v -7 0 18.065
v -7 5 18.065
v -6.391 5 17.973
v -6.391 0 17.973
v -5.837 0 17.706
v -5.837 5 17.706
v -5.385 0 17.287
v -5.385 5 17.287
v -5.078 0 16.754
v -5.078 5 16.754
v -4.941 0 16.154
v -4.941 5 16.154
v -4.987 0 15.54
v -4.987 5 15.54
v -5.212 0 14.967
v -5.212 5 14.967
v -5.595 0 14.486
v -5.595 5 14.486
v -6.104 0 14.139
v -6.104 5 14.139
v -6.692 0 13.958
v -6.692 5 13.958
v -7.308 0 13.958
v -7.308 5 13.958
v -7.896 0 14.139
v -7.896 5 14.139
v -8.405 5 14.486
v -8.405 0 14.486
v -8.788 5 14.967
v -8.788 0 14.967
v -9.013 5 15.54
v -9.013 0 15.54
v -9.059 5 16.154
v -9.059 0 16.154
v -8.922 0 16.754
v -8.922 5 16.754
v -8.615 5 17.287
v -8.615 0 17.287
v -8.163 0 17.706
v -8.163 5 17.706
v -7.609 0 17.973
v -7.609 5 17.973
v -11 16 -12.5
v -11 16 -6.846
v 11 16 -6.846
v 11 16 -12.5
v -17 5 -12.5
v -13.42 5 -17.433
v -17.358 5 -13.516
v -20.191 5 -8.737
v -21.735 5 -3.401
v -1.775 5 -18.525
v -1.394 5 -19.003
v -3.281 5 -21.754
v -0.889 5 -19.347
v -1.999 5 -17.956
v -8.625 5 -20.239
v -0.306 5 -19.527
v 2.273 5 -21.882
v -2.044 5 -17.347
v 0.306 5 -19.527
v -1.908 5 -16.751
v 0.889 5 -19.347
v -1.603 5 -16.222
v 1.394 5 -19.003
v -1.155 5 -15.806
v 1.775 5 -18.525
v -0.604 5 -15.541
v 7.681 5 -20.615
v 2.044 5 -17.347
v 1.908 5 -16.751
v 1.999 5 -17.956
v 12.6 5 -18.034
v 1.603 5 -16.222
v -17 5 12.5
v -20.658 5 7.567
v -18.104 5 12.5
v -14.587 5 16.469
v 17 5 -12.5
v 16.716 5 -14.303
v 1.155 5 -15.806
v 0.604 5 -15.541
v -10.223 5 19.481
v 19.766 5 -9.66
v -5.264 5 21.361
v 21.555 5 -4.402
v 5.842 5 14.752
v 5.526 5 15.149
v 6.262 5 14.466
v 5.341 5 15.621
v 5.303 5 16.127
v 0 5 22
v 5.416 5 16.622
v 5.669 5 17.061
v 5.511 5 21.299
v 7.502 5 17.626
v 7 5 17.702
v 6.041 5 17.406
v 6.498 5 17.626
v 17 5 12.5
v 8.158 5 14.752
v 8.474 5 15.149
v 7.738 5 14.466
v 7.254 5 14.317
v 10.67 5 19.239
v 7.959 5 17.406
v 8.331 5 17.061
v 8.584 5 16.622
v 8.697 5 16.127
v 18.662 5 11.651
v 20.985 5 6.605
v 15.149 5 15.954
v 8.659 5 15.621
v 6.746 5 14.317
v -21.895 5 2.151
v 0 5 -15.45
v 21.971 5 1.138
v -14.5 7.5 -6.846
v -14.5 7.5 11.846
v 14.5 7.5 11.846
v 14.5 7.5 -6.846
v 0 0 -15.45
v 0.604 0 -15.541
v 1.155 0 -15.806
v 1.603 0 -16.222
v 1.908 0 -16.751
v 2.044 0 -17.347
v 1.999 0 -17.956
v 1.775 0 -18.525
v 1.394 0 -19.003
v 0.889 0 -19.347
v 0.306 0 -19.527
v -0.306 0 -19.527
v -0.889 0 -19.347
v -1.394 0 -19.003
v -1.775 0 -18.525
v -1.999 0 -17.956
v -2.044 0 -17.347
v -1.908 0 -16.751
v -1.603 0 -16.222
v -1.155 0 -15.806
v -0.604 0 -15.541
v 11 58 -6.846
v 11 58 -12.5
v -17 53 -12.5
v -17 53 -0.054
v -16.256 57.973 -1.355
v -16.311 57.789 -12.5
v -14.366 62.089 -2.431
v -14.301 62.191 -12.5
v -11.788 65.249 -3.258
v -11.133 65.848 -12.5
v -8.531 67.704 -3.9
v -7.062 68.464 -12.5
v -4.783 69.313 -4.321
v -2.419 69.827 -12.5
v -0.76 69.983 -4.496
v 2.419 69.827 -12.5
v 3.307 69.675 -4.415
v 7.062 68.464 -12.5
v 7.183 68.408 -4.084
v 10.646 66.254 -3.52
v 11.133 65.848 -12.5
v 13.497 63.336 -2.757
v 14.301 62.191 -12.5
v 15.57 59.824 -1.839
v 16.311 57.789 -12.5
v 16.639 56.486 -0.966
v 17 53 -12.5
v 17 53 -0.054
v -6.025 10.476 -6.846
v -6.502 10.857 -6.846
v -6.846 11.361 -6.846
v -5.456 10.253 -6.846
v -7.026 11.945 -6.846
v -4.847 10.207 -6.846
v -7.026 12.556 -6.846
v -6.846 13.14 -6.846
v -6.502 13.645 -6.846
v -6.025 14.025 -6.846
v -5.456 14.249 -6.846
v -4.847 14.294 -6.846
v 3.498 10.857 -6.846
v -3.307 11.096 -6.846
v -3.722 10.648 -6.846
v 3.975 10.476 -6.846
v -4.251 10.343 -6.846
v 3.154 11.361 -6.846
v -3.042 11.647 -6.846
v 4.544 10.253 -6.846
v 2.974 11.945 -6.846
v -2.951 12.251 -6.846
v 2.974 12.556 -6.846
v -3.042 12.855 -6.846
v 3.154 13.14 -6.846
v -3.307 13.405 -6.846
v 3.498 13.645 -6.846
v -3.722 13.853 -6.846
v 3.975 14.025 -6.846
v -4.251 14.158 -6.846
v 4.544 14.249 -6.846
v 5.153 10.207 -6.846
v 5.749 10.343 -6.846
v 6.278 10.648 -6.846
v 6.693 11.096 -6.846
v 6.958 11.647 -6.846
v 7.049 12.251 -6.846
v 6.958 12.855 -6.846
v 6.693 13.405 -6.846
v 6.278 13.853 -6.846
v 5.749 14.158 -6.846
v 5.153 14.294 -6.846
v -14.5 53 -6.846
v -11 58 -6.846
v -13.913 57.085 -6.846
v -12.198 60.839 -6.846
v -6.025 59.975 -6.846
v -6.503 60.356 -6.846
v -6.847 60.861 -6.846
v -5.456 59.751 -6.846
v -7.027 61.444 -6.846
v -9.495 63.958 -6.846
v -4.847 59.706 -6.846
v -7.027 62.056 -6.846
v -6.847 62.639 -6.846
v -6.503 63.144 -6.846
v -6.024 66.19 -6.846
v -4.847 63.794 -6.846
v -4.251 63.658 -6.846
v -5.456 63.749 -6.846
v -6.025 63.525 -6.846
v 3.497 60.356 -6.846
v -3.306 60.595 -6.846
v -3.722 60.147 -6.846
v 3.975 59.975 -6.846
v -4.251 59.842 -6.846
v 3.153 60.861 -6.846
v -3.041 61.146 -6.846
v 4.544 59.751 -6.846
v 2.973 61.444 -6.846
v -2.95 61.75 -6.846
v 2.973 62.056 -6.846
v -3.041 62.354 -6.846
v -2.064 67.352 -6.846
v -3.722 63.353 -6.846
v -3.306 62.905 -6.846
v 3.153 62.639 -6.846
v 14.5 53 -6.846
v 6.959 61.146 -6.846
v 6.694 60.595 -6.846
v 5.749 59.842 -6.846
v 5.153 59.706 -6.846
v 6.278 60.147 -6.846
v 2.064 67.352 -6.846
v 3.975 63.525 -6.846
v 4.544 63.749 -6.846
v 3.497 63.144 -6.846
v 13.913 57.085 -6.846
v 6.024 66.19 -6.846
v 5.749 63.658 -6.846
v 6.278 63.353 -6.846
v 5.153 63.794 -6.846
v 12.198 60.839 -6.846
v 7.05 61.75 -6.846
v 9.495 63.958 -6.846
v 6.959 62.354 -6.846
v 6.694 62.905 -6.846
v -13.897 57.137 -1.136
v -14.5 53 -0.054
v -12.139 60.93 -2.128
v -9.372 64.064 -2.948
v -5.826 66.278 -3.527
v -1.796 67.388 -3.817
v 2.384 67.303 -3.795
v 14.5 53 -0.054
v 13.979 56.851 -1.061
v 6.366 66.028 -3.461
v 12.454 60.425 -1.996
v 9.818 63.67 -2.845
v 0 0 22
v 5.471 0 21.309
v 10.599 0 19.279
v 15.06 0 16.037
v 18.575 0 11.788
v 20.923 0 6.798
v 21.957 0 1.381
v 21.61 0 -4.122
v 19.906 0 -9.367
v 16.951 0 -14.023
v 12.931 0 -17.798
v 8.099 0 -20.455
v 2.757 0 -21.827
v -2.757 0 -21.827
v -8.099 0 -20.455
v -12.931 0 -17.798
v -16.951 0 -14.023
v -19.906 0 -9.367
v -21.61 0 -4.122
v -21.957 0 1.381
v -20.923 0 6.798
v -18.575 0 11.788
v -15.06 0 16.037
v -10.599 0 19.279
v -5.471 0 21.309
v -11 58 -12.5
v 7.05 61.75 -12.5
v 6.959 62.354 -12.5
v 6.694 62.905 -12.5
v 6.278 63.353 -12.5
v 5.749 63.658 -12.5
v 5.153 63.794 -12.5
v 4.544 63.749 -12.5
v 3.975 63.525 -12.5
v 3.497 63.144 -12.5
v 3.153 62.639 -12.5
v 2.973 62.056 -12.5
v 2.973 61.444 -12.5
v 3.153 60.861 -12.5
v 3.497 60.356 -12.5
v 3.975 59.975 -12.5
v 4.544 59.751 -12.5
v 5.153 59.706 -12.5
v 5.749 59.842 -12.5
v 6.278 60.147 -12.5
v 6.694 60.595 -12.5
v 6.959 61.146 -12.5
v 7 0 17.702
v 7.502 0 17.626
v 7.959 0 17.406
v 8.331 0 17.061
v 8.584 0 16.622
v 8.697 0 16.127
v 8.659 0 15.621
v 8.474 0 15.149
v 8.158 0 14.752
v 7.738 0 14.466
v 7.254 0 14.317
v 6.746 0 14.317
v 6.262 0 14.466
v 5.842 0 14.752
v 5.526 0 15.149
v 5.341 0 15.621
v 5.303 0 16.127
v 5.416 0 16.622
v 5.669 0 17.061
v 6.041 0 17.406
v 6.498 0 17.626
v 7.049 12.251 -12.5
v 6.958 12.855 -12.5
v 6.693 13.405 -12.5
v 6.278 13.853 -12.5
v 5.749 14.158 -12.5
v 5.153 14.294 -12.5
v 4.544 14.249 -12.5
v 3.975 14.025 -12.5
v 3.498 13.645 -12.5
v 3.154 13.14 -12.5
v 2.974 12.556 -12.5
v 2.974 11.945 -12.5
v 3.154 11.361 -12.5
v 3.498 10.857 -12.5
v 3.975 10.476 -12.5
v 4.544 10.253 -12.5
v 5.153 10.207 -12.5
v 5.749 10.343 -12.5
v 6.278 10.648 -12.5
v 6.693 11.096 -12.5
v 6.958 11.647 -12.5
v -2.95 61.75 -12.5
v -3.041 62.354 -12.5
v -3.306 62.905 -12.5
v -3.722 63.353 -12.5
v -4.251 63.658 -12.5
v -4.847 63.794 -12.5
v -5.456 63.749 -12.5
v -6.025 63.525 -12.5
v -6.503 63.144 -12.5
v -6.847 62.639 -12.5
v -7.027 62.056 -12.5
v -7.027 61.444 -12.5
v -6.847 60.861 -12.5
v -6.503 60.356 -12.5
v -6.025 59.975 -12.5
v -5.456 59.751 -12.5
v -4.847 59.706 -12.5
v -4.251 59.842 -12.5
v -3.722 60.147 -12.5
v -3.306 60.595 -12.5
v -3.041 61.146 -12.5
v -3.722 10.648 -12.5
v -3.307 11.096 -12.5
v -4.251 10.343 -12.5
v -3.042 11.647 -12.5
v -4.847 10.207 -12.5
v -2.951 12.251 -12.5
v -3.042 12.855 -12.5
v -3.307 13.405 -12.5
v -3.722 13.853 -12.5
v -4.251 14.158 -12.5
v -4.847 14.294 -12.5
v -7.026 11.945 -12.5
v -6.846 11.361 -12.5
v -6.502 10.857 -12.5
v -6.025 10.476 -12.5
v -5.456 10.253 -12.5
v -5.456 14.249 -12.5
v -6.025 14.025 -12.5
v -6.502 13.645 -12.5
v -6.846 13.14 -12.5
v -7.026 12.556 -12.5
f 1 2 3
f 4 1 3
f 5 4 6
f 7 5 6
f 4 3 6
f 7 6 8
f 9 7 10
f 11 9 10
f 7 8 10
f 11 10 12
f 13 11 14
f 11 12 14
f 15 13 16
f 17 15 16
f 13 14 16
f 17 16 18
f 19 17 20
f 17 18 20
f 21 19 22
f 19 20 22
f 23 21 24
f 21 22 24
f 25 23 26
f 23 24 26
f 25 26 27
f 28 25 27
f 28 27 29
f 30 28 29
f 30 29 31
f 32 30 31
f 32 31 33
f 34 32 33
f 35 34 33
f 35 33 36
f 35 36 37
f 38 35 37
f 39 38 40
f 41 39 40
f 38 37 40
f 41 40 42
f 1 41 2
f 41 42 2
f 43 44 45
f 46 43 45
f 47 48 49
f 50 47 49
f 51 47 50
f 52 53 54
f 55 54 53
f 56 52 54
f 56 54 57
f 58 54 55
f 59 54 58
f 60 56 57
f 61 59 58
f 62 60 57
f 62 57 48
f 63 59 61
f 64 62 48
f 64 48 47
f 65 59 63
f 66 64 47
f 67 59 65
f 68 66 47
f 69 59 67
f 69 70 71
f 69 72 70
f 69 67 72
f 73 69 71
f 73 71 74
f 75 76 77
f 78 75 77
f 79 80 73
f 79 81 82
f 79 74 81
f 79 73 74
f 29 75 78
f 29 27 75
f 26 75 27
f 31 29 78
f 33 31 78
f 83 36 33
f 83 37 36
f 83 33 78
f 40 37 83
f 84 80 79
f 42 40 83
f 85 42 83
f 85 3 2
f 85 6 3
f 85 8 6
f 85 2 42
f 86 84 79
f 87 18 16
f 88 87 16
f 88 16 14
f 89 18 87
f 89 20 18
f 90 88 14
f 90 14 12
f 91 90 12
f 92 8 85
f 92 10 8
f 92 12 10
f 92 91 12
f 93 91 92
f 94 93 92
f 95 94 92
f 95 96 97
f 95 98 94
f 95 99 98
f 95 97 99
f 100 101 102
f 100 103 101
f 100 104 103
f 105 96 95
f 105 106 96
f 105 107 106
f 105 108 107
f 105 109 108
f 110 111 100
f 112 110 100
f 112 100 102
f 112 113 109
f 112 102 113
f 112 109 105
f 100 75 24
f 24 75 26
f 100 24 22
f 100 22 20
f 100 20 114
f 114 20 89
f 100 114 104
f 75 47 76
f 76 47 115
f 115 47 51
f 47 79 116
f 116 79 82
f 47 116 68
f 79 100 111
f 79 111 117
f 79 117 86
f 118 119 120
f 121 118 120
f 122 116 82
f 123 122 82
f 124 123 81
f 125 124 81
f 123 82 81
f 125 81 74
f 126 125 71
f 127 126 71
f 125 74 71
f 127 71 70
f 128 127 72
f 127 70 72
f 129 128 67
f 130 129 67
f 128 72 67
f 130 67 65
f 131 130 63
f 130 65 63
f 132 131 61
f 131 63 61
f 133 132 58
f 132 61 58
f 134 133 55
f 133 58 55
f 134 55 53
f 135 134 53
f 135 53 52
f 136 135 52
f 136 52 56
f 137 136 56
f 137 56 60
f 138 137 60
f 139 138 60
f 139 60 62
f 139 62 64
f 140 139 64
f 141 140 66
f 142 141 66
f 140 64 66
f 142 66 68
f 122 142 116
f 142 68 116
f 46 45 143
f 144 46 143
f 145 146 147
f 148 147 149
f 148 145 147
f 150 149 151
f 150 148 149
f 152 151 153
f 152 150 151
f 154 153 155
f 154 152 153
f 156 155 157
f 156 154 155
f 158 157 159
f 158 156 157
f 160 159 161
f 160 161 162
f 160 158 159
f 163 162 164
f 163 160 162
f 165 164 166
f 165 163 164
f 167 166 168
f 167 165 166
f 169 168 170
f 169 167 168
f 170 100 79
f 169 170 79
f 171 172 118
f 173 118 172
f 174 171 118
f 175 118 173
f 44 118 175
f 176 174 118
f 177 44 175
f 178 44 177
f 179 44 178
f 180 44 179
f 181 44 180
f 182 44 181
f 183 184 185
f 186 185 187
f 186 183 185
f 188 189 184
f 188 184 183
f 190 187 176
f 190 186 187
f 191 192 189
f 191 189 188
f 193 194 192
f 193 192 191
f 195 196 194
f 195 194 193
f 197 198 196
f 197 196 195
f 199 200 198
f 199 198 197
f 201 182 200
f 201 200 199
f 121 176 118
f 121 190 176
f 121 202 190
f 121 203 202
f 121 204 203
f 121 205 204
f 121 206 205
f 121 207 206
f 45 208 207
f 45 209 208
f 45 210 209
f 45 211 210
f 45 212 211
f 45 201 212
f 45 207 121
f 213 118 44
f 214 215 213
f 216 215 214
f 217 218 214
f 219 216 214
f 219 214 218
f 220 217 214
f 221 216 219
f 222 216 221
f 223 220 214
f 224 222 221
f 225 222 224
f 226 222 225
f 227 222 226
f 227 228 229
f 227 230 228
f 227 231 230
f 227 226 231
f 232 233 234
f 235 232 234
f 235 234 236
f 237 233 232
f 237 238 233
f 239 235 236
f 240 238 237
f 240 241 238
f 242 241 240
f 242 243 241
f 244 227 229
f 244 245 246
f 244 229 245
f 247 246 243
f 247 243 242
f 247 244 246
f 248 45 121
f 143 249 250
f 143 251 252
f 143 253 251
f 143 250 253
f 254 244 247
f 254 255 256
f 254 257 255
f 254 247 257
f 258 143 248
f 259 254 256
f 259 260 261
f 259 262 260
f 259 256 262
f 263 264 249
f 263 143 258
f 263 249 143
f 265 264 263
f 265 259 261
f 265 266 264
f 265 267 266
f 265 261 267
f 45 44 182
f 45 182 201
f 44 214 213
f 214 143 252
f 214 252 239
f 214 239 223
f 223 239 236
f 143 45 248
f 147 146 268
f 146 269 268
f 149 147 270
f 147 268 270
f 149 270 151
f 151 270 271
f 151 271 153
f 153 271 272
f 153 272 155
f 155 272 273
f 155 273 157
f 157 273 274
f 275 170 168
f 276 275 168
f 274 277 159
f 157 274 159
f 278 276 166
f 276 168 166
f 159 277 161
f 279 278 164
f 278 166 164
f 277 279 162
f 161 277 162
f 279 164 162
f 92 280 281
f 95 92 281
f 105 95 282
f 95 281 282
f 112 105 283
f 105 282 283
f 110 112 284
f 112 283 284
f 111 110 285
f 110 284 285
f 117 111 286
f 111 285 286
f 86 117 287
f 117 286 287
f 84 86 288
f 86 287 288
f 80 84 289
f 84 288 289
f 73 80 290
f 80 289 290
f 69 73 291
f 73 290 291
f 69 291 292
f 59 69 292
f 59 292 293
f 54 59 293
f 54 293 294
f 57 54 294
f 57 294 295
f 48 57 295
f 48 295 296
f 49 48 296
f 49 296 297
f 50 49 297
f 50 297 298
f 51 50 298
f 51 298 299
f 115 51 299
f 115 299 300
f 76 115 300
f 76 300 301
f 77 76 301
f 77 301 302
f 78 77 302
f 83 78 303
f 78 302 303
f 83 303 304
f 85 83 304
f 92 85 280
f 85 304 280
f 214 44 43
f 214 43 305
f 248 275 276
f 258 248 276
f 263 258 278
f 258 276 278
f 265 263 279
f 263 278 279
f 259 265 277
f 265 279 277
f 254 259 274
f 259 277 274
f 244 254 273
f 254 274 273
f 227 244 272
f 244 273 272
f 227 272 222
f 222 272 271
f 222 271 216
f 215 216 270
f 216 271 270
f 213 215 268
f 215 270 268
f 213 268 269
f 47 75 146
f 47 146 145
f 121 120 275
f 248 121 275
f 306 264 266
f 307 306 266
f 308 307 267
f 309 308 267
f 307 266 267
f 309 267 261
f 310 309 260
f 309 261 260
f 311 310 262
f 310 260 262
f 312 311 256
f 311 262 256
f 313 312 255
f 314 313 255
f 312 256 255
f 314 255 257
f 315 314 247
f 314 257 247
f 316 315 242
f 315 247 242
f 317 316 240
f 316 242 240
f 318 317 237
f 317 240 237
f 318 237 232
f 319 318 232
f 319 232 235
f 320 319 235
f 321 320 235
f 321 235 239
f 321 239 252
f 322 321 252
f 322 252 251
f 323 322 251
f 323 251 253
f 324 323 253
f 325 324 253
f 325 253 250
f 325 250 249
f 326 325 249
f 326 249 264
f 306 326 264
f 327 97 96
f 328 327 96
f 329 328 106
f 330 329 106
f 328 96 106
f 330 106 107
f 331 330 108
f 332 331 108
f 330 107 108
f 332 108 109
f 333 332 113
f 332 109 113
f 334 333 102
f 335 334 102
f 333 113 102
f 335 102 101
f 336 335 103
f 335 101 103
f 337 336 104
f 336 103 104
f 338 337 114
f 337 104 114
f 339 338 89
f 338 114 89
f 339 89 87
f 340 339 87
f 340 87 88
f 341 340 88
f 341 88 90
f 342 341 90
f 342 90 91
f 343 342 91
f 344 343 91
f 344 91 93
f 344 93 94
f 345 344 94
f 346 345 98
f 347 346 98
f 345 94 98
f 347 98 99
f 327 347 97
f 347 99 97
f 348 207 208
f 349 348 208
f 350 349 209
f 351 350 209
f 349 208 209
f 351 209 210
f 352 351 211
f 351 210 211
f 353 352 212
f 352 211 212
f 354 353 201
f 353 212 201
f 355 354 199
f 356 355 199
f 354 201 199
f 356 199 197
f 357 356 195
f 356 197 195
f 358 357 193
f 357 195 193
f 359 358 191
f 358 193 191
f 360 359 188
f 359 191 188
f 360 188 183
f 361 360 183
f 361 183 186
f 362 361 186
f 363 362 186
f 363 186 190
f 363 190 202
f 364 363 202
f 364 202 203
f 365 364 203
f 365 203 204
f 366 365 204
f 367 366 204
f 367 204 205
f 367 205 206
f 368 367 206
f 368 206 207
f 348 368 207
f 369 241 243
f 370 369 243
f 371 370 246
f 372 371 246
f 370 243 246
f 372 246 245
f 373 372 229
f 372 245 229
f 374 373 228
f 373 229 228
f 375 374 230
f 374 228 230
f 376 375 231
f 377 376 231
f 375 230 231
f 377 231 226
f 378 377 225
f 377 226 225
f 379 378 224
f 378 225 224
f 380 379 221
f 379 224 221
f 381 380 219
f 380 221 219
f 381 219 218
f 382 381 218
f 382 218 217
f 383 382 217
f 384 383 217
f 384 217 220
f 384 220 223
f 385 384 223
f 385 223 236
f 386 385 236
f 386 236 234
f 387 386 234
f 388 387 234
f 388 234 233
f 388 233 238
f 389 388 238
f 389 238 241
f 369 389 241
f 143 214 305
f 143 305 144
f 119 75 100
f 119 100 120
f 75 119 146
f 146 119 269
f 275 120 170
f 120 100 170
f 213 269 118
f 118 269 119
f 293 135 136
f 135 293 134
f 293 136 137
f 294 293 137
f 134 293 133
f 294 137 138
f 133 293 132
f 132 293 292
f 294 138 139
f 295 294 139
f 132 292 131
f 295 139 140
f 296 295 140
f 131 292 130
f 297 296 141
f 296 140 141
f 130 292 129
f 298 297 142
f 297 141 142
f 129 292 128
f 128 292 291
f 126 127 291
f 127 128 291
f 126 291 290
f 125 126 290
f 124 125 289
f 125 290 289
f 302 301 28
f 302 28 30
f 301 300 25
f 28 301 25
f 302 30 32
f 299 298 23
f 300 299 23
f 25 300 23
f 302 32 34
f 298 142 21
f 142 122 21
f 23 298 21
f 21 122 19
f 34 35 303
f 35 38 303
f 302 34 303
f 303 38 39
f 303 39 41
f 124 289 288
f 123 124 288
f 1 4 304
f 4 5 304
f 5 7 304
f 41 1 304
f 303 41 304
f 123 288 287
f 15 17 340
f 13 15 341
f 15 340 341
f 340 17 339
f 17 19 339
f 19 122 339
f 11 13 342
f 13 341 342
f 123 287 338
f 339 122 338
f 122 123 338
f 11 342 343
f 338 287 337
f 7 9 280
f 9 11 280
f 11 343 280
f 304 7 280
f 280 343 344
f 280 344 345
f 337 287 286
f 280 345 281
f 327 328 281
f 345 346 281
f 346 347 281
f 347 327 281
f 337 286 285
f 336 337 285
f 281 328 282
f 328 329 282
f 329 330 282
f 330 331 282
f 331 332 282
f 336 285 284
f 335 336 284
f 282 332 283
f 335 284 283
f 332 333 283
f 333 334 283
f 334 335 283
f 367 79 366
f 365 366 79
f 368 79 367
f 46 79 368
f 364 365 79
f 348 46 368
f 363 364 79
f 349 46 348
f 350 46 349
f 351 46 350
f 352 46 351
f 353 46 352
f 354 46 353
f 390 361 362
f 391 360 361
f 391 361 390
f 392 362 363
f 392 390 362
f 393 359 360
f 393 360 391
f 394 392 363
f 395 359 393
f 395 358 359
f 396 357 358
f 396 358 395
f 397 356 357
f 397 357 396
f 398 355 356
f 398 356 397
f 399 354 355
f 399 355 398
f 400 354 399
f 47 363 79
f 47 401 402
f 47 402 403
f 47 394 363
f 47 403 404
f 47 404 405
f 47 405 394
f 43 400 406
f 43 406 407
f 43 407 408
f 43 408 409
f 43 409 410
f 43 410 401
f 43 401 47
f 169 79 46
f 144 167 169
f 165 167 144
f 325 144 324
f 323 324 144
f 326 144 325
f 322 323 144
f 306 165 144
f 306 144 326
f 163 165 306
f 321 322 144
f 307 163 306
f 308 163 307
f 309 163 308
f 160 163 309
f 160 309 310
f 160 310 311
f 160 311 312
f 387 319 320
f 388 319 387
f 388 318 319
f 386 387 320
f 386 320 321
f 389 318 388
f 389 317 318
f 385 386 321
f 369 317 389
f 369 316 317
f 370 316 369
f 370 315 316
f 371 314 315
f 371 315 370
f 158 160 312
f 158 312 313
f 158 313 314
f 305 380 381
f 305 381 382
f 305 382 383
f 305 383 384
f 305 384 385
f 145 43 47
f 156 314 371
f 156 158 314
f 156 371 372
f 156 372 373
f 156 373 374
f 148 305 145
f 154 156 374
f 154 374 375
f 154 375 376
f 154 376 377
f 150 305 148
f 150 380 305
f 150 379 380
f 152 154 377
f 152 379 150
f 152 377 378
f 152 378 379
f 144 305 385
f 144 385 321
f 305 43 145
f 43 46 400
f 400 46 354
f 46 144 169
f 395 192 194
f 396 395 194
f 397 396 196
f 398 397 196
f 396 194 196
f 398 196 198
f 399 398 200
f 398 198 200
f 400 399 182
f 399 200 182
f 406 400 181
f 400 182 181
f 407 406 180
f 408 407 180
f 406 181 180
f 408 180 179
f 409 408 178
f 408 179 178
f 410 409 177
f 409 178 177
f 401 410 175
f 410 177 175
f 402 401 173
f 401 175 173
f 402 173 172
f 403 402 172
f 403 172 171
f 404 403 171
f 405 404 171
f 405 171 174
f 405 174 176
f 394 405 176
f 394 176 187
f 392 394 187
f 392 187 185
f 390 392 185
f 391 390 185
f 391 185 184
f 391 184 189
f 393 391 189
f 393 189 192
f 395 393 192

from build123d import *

# Parameters (mm, degrees)
CROQUIS1_R              = 22
SALIENTE_EXTRUIR1_DEPTH = 5
CROQUIS2_R              = 2.05
CROQUIS2_R_2            = 2.065143699
CROQUIS2_R_3            = 1.702015819
CORTAR_EXTRUIR1_DEPTH   = 5
CROQUIS3_W              = 34
CROQUIS3_H              = 25
SALIENTE_EXTRUIR2_DEPTH = 48
SALIENTE_EXTRUIR3_DEPTH = 25
CORTAR_EXTRUIR2_DEPTH   = 19.346
CROQUIS6_R              = 2.049356991
CROQUIS6_R_2            = 2.05
CROQUIS6_W              = 22
CROQUIS6_H              = 42
CORTAR_EXTRUIR3_DEPTH   = 19.346
CORTAR_EXTRUIR4_DEPTH   = 49.346


with BuildPart() as part:
    # Croquis1 → Saliente-Extruir1 (new body)
    with BuildSketch(Plane(origin=(0, 0, 0), x_dir=(1, 0, 0), z_dir=(0, 1, 0))):
        with Locations(Location((0, 0, 0), (0, 0, 270))):
            Circle(CROQUIS1_R)
    extrude(amount=SALIENTE_EXTRUIR1_DEPTH)

    # Croquis2 → Cortar-Extruir1 (cut)
    with BuildSketch(Plane(origin=(0, 5, 0), x_dir=(1, 0, 0), z_dir=(0, 1, 0))):
        with Locations(Location((0, 17.5, 0), (0, 0, 270))):
            Circle(CROQUIS2_R)
        with Locations(Location((-7, -15.999727998, 0), (0, 0, 270))):
            Circle(CROQUIS2_R_2)
        with Locations(Location((7, -15.999727998, 0), (0, 0, 270))):
            Circle(CROQUIS2_R_3)
    extrude(amount=-CORTAR_EXTRUIR1_DEPTH, mode=Mode.SUBTRACT)

    # Croquis3 → Saliente-Extruir2 (add)
    with BuildSketch(Plane(origin=(0, 5, 0), x_dir=(1, 0, 0), z_dir=(0, 1, 0))):
        Rectangle(CROQUIS3_W, CROQUIS3_H)
    extrude(amount=SALIENTE_EXTRUIR2_DEPTH)

    # Croquis4 → Saliente-Extruir3 (add)
    with BuildSketch(Plane(origin=(0, 0, -12.5), x_dir=(-1, 0, 0), z_dir=(0, 0, -1))):
        with BuildLine():
            Line((-17, 53), (17, 53))
            ThreePointArc((17, 53), (0, 70), (-17, 53))
        make_face()
    extrude(amount=-SALIENTE_EXTRUIR3_DEPTH)

    # Croquis5 → Cortar-Extruir2 (cut)
    with BuildSketch(Plane.XY.offset(12.5)):
        with BuildLine():
            Line((14.5, 7.5), (14.5, 53))
            ThreePointArc((14.5, 53), (0, 67.5), (-14.5, 53))
            Line((-14.5, 53), (-14.5, 7.5))
            Line((-14.5, 7.5), (14.5, 7.5))
        make_face()
    extrude(amount=-CORTAR_EXTRUIR2_DEPTH, mode=Mode.SUBTRACT)

    # Croquis6 → Cortar-Extruir3 (cut)
    with BuildSketch(Plane.XY.offset(-6.846)):
        with Locations((-5, 12.250643009)):
            Circle(CROQUIS6_R)
        with Locations((5, 12.250643009)):
            Circle(CROQUIS6_R)
        with Locations((-5, 61.75)):
            Circle(CROQUIS6_R_2)
        with Locations((5, 61.75)):
            Circle(CROQUIS6_R_2)
        with Locations((0, 37)):
            Rectangle(CROQUIS6_W, CROQUIS6_H)
    extrude(amount=-CORTAR_EXTRUIR3_DEPTH, mode=Mode.SUBTRACT)

    # Croquis7 → Cortar-Extruir4 (cut)
    with BuildSketch(Plane(origin=(17, 0, 0), x_dir=(0, 0, -1), z_dir=(1, 0, 0))):
        Polygon((-12.5, 53), (0.054068921, 53), (10.400499838, 92.559180941), (-12.5, 92.559180941), align=None)
        Polygon((-12.5, 53), (-12.5, 5), (0.054068921, 53), align=None)
    extrude(amount=-CORTAR_EXTRUIR4_DEPTH, mode=Mode.SUBTRACT)


solid = part.part
